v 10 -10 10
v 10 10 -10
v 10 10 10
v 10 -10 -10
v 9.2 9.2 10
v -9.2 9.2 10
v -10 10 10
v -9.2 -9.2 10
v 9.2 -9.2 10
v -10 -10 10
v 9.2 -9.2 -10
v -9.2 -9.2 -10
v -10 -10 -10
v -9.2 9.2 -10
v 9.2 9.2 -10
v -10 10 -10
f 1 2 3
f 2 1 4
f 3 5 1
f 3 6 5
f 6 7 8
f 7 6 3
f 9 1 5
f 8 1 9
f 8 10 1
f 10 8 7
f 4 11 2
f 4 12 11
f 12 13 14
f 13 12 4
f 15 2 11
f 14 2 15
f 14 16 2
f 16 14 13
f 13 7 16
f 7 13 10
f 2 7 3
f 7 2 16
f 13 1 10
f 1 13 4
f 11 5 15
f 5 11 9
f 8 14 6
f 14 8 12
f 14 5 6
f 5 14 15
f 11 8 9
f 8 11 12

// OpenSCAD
// size of cube
d = 20; //1 mm
// wall thickness
wall = 0.8; //0.1

// interference for good intersections
tiny = 0.001;


wallcube(d=d,wall=wall);

module wallcube(d=d,wall=wall,tiny=tiny){
    difference(){
        cube([d,d,d],center=true);
        translate([0,0,-tiny])
            cube([d-2*wall,d-2*wall,d+2*tiny],center=true);
    }
}
    
